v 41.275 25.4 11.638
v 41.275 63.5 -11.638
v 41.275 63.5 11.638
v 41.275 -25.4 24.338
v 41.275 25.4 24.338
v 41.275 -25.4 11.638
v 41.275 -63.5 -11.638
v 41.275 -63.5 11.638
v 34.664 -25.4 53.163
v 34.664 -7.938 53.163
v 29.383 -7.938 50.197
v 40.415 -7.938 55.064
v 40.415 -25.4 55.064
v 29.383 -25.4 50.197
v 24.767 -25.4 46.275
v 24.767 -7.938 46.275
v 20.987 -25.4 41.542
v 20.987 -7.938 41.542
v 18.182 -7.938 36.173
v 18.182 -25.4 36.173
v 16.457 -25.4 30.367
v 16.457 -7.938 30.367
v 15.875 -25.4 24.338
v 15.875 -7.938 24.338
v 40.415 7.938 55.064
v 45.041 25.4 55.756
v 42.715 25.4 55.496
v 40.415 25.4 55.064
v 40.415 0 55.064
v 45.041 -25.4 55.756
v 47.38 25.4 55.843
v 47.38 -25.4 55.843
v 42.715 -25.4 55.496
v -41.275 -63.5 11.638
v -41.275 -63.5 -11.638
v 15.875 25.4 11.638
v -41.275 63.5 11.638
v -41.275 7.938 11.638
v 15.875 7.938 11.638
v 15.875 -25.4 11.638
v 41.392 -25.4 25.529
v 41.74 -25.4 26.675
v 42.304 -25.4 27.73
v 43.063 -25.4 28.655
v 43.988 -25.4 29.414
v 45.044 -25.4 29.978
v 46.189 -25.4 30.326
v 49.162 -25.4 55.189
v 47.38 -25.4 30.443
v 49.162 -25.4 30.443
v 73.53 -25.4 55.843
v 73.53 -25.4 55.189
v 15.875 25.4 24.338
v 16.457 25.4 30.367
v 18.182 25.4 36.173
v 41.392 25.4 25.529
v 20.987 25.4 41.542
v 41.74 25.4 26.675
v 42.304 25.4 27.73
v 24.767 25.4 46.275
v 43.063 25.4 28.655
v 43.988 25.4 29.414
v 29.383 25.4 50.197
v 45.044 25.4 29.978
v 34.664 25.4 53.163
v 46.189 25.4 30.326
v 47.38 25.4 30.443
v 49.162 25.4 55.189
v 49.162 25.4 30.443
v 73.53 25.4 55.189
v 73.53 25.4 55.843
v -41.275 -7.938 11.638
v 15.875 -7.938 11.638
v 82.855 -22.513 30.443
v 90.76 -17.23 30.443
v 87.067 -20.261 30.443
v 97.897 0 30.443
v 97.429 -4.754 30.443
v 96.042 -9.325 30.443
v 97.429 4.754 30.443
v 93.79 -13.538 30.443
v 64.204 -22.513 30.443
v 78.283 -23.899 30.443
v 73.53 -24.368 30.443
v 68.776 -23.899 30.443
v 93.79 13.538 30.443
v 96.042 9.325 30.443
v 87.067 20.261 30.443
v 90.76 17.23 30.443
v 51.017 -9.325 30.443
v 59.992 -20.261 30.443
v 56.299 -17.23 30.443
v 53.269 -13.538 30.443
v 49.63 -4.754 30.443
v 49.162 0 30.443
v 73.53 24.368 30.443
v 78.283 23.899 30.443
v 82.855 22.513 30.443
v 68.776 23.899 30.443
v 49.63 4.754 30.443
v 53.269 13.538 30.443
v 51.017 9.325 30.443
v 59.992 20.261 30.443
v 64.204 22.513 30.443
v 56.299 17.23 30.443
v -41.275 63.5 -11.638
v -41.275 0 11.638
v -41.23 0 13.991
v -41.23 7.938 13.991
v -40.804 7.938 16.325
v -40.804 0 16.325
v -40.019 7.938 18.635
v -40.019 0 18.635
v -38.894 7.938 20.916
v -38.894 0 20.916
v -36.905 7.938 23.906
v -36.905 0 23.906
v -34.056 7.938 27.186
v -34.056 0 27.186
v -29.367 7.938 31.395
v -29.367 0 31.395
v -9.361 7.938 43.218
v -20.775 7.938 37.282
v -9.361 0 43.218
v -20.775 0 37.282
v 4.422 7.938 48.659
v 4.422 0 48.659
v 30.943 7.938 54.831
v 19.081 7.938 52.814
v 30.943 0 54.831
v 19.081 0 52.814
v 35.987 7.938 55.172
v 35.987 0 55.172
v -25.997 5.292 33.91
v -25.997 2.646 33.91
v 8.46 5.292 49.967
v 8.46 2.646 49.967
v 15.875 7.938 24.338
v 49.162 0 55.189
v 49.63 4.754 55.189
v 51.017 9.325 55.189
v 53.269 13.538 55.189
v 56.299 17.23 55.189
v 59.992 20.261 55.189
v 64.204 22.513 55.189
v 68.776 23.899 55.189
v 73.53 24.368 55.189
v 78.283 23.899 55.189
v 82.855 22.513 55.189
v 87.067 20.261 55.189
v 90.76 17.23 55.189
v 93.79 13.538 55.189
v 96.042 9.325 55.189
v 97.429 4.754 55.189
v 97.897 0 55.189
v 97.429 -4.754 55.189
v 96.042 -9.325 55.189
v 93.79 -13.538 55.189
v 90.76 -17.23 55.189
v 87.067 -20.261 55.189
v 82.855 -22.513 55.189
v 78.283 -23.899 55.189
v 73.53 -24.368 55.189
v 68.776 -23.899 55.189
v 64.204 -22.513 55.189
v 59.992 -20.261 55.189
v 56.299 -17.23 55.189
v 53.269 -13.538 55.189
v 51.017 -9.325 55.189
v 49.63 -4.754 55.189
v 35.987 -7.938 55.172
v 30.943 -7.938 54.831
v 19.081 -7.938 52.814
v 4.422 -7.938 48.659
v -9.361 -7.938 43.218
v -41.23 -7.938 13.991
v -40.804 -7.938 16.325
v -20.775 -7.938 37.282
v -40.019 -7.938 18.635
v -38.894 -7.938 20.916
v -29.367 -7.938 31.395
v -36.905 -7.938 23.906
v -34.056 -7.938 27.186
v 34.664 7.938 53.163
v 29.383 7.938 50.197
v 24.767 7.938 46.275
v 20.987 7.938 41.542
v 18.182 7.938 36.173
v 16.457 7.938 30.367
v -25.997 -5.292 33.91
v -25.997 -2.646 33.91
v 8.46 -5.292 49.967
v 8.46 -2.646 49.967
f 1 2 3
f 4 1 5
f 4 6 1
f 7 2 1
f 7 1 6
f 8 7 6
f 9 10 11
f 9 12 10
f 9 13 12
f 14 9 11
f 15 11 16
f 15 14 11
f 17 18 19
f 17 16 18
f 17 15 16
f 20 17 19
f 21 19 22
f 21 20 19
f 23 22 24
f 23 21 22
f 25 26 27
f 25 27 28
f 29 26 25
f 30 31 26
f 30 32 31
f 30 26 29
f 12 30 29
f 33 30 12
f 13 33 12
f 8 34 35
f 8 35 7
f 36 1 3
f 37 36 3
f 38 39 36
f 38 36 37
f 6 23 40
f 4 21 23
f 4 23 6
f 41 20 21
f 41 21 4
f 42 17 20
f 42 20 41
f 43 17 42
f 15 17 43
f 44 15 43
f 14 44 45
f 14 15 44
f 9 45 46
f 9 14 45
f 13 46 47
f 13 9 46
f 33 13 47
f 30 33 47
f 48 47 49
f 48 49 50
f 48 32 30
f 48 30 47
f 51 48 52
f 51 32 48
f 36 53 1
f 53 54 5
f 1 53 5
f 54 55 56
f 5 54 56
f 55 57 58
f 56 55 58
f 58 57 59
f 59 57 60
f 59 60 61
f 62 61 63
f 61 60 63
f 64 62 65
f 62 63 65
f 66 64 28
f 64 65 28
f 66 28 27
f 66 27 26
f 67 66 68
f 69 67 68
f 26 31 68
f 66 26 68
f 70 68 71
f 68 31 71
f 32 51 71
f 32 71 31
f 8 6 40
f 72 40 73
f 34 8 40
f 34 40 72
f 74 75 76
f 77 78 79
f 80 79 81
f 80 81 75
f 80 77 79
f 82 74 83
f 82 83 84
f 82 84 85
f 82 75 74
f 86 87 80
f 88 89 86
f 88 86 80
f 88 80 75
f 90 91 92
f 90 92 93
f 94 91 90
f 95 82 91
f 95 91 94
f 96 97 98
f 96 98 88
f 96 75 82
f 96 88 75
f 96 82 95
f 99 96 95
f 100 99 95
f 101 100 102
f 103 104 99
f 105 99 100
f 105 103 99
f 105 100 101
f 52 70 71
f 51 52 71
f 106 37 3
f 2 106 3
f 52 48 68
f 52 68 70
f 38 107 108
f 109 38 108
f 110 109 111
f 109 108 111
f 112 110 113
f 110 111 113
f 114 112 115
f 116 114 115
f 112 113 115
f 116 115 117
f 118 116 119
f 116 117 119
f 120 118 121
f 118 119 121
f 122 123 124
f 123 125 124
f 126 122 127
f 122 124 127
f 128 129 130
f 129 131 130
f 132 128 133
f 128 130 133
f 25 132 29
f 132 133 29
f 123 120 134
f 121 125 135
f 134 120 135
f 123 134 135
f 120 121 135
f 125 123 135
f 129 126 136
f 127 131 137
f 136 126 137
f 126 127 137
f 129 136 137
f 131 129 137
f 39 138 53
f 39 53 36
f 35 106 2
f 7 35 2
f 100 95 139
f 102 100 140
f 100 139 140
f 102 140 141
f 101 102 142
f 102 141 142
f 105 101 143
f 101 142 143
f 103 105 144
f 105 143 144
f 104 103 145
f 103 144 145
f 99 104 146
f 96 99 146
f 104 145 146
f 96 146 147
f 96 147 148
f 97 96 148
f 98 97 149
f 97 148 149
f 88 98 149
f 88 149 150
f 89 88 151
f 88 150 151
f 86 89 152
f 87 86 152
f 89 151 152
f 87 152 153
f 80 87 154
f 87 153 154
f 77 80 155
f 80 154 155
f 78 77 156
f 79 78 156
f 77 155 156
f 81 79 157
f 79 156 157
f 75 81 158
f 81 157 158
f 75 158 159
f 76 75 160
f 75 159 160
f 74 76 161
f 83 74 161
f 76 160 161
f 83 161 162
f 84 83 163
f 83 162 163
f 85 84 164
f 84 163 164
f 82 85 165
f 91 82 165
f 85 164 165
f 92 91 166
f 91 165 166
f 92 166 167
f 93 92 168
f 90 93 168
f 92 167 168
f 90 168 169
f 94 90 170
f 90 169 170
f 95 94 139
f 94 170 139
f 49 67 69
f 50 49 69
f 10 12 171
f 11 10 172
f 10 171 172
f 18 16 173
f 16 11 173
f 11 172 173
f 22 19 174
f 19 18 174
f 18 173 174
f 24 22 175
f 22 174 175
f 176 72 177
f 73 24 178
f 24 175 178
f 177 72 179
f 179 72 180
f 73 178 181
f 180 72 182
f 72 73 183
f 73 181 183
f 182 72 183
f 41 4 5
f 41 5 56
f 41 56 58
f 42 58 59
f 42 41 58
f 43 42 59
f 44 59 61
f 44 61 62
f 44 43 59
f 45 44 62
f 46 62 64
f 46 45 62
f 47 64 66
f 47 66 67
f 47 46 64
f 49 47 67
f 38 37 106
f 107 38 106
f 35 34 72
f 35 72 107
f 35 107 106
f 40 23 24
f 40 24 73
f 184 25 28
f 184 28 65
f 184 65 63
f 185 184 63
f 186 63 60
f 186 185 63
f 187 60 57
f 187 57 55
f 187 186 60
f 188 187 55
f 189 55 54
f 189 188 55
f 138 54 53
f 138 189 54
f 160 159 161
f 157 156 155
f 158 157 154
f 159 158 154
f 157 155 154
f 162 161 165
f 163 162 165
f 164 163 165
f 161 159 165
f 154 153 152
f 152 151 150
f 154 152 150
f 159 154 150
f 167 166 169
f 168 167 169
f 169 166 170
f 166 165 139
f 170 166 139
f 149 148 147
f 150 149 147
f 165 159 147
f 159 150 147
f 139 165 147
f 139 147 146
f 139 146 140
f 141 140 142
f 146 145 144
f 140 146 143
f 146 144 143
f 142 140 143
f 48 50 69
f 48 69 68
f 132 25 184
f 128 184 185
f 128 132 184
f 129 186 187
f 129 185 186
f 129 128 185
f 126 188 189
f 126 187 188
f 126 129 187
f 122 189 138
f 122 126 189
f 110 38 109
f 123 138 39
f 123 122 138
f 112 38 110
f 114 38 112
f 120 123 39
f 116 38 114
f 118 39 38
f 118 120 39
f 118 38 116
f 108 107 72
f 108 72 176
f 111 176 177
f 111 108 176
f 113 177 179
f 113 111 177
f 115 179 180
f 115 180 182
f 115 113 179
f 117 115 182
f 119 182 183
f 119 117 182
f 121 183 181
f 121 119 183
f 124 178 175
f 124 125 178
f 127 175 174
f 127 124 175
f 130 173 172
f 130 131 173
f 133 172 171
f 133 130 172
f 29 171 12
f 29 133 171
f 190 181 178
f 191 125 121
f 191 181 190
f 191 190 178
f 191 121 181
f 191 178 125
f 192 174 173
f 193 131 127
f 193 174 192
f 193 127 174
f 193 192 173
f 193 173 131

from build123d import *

# Parameters (mm, degrees)
F1_DEPTH = 63.5
F2_DEPTH = 25.4
F3_DEPTH = 7.9375
F0_W     = 24.367564
F0_H     = 24.745591


with BuildPart() as f1:
    # F0 (on Front) → F1 (new body, symmetric)
    with BuildSketch(Plane.XZ):
        Polygon((15.875, 11.638373), (-41.275, 11.638373), (-41.275, -11.638373), (41.275, -11.638373), (41.275, 11.638373), align=None)
    extrude(amount=F1_DEPTH, both=True)

    # F0 (on Front) → F2 (join, symmetric)
    with BuildSketch(Plane.XZ):
        with BuildLine():
            Line((15.875, 24.338373), (15.875, 11.638373))
            Line((15.875, 11.638373), (41.275, 11.638373))
            Line((41.275, 11.638373), (41.275, 24.338373))
            ThreePointArc((41.275, 24.338373), (43.063038, 28.655079), (47.379744, 30.443118))
            Line((47.379744, 30.443118), (49.161999, 30.443118))
            Line((49.161999, 30.443118), (49.161999, 55.188709))
            Line((49.161999, 55.188709), (73.529563, 55.188709))
            Line((73.529563, 55.188709), (73.529563, 55.843118))
            Line((73.529563, 55.843118), (47.379744, 55.843118))
            ThreePointArc((47.379744, 55.843118), (43.875523, 55.647627), (40.414789, 55.06358))
            ThreePointArc((40.414789, 55.06358), (22.7629, 43.9995), (15.875, 24.338373))
        make_face()
    extrude(amount=F2_DEPTH, both=True)

    # F0 (on Front) → F3 (join, symmetric)
    with BuildSketch(Plane.XZ):
        with BuildLine():
            add(Edge.make_bspline(
                [(-41.275, 11.638373), (-42.812973, 35.437204), (16.937252, 57.027623), (40.414789, 55.06358)],
                knots=[0, 0, 0, 0, 92.514703, 92.514703, 92.514703, 92.514703], degree=3))
            Line((-41.275, 11.638373), (15.875, 11.638373))
            Line((15.875, 11.638373), (15.875, 24.338373))
            ThreePointArc((15.875, 24.338373), (22.7629, 43.9995), (40.414789, 55.06358))
        make_face()
    extrude(amount=F3_DEPTH, both=True)


with BuildPart() as f4:
    # F0 (on Front) → F4 (revolve)
    with BuildSketch(Plane.XZ):
        with Locations((61.345781, 42.815913)):
            Rectangle(F0_W, F0_H)
    revolve(axis=Axis((73.529563, 0, 43.143118), (0, 0, -1)))


solid = Compound([f1.part, f4.part])
